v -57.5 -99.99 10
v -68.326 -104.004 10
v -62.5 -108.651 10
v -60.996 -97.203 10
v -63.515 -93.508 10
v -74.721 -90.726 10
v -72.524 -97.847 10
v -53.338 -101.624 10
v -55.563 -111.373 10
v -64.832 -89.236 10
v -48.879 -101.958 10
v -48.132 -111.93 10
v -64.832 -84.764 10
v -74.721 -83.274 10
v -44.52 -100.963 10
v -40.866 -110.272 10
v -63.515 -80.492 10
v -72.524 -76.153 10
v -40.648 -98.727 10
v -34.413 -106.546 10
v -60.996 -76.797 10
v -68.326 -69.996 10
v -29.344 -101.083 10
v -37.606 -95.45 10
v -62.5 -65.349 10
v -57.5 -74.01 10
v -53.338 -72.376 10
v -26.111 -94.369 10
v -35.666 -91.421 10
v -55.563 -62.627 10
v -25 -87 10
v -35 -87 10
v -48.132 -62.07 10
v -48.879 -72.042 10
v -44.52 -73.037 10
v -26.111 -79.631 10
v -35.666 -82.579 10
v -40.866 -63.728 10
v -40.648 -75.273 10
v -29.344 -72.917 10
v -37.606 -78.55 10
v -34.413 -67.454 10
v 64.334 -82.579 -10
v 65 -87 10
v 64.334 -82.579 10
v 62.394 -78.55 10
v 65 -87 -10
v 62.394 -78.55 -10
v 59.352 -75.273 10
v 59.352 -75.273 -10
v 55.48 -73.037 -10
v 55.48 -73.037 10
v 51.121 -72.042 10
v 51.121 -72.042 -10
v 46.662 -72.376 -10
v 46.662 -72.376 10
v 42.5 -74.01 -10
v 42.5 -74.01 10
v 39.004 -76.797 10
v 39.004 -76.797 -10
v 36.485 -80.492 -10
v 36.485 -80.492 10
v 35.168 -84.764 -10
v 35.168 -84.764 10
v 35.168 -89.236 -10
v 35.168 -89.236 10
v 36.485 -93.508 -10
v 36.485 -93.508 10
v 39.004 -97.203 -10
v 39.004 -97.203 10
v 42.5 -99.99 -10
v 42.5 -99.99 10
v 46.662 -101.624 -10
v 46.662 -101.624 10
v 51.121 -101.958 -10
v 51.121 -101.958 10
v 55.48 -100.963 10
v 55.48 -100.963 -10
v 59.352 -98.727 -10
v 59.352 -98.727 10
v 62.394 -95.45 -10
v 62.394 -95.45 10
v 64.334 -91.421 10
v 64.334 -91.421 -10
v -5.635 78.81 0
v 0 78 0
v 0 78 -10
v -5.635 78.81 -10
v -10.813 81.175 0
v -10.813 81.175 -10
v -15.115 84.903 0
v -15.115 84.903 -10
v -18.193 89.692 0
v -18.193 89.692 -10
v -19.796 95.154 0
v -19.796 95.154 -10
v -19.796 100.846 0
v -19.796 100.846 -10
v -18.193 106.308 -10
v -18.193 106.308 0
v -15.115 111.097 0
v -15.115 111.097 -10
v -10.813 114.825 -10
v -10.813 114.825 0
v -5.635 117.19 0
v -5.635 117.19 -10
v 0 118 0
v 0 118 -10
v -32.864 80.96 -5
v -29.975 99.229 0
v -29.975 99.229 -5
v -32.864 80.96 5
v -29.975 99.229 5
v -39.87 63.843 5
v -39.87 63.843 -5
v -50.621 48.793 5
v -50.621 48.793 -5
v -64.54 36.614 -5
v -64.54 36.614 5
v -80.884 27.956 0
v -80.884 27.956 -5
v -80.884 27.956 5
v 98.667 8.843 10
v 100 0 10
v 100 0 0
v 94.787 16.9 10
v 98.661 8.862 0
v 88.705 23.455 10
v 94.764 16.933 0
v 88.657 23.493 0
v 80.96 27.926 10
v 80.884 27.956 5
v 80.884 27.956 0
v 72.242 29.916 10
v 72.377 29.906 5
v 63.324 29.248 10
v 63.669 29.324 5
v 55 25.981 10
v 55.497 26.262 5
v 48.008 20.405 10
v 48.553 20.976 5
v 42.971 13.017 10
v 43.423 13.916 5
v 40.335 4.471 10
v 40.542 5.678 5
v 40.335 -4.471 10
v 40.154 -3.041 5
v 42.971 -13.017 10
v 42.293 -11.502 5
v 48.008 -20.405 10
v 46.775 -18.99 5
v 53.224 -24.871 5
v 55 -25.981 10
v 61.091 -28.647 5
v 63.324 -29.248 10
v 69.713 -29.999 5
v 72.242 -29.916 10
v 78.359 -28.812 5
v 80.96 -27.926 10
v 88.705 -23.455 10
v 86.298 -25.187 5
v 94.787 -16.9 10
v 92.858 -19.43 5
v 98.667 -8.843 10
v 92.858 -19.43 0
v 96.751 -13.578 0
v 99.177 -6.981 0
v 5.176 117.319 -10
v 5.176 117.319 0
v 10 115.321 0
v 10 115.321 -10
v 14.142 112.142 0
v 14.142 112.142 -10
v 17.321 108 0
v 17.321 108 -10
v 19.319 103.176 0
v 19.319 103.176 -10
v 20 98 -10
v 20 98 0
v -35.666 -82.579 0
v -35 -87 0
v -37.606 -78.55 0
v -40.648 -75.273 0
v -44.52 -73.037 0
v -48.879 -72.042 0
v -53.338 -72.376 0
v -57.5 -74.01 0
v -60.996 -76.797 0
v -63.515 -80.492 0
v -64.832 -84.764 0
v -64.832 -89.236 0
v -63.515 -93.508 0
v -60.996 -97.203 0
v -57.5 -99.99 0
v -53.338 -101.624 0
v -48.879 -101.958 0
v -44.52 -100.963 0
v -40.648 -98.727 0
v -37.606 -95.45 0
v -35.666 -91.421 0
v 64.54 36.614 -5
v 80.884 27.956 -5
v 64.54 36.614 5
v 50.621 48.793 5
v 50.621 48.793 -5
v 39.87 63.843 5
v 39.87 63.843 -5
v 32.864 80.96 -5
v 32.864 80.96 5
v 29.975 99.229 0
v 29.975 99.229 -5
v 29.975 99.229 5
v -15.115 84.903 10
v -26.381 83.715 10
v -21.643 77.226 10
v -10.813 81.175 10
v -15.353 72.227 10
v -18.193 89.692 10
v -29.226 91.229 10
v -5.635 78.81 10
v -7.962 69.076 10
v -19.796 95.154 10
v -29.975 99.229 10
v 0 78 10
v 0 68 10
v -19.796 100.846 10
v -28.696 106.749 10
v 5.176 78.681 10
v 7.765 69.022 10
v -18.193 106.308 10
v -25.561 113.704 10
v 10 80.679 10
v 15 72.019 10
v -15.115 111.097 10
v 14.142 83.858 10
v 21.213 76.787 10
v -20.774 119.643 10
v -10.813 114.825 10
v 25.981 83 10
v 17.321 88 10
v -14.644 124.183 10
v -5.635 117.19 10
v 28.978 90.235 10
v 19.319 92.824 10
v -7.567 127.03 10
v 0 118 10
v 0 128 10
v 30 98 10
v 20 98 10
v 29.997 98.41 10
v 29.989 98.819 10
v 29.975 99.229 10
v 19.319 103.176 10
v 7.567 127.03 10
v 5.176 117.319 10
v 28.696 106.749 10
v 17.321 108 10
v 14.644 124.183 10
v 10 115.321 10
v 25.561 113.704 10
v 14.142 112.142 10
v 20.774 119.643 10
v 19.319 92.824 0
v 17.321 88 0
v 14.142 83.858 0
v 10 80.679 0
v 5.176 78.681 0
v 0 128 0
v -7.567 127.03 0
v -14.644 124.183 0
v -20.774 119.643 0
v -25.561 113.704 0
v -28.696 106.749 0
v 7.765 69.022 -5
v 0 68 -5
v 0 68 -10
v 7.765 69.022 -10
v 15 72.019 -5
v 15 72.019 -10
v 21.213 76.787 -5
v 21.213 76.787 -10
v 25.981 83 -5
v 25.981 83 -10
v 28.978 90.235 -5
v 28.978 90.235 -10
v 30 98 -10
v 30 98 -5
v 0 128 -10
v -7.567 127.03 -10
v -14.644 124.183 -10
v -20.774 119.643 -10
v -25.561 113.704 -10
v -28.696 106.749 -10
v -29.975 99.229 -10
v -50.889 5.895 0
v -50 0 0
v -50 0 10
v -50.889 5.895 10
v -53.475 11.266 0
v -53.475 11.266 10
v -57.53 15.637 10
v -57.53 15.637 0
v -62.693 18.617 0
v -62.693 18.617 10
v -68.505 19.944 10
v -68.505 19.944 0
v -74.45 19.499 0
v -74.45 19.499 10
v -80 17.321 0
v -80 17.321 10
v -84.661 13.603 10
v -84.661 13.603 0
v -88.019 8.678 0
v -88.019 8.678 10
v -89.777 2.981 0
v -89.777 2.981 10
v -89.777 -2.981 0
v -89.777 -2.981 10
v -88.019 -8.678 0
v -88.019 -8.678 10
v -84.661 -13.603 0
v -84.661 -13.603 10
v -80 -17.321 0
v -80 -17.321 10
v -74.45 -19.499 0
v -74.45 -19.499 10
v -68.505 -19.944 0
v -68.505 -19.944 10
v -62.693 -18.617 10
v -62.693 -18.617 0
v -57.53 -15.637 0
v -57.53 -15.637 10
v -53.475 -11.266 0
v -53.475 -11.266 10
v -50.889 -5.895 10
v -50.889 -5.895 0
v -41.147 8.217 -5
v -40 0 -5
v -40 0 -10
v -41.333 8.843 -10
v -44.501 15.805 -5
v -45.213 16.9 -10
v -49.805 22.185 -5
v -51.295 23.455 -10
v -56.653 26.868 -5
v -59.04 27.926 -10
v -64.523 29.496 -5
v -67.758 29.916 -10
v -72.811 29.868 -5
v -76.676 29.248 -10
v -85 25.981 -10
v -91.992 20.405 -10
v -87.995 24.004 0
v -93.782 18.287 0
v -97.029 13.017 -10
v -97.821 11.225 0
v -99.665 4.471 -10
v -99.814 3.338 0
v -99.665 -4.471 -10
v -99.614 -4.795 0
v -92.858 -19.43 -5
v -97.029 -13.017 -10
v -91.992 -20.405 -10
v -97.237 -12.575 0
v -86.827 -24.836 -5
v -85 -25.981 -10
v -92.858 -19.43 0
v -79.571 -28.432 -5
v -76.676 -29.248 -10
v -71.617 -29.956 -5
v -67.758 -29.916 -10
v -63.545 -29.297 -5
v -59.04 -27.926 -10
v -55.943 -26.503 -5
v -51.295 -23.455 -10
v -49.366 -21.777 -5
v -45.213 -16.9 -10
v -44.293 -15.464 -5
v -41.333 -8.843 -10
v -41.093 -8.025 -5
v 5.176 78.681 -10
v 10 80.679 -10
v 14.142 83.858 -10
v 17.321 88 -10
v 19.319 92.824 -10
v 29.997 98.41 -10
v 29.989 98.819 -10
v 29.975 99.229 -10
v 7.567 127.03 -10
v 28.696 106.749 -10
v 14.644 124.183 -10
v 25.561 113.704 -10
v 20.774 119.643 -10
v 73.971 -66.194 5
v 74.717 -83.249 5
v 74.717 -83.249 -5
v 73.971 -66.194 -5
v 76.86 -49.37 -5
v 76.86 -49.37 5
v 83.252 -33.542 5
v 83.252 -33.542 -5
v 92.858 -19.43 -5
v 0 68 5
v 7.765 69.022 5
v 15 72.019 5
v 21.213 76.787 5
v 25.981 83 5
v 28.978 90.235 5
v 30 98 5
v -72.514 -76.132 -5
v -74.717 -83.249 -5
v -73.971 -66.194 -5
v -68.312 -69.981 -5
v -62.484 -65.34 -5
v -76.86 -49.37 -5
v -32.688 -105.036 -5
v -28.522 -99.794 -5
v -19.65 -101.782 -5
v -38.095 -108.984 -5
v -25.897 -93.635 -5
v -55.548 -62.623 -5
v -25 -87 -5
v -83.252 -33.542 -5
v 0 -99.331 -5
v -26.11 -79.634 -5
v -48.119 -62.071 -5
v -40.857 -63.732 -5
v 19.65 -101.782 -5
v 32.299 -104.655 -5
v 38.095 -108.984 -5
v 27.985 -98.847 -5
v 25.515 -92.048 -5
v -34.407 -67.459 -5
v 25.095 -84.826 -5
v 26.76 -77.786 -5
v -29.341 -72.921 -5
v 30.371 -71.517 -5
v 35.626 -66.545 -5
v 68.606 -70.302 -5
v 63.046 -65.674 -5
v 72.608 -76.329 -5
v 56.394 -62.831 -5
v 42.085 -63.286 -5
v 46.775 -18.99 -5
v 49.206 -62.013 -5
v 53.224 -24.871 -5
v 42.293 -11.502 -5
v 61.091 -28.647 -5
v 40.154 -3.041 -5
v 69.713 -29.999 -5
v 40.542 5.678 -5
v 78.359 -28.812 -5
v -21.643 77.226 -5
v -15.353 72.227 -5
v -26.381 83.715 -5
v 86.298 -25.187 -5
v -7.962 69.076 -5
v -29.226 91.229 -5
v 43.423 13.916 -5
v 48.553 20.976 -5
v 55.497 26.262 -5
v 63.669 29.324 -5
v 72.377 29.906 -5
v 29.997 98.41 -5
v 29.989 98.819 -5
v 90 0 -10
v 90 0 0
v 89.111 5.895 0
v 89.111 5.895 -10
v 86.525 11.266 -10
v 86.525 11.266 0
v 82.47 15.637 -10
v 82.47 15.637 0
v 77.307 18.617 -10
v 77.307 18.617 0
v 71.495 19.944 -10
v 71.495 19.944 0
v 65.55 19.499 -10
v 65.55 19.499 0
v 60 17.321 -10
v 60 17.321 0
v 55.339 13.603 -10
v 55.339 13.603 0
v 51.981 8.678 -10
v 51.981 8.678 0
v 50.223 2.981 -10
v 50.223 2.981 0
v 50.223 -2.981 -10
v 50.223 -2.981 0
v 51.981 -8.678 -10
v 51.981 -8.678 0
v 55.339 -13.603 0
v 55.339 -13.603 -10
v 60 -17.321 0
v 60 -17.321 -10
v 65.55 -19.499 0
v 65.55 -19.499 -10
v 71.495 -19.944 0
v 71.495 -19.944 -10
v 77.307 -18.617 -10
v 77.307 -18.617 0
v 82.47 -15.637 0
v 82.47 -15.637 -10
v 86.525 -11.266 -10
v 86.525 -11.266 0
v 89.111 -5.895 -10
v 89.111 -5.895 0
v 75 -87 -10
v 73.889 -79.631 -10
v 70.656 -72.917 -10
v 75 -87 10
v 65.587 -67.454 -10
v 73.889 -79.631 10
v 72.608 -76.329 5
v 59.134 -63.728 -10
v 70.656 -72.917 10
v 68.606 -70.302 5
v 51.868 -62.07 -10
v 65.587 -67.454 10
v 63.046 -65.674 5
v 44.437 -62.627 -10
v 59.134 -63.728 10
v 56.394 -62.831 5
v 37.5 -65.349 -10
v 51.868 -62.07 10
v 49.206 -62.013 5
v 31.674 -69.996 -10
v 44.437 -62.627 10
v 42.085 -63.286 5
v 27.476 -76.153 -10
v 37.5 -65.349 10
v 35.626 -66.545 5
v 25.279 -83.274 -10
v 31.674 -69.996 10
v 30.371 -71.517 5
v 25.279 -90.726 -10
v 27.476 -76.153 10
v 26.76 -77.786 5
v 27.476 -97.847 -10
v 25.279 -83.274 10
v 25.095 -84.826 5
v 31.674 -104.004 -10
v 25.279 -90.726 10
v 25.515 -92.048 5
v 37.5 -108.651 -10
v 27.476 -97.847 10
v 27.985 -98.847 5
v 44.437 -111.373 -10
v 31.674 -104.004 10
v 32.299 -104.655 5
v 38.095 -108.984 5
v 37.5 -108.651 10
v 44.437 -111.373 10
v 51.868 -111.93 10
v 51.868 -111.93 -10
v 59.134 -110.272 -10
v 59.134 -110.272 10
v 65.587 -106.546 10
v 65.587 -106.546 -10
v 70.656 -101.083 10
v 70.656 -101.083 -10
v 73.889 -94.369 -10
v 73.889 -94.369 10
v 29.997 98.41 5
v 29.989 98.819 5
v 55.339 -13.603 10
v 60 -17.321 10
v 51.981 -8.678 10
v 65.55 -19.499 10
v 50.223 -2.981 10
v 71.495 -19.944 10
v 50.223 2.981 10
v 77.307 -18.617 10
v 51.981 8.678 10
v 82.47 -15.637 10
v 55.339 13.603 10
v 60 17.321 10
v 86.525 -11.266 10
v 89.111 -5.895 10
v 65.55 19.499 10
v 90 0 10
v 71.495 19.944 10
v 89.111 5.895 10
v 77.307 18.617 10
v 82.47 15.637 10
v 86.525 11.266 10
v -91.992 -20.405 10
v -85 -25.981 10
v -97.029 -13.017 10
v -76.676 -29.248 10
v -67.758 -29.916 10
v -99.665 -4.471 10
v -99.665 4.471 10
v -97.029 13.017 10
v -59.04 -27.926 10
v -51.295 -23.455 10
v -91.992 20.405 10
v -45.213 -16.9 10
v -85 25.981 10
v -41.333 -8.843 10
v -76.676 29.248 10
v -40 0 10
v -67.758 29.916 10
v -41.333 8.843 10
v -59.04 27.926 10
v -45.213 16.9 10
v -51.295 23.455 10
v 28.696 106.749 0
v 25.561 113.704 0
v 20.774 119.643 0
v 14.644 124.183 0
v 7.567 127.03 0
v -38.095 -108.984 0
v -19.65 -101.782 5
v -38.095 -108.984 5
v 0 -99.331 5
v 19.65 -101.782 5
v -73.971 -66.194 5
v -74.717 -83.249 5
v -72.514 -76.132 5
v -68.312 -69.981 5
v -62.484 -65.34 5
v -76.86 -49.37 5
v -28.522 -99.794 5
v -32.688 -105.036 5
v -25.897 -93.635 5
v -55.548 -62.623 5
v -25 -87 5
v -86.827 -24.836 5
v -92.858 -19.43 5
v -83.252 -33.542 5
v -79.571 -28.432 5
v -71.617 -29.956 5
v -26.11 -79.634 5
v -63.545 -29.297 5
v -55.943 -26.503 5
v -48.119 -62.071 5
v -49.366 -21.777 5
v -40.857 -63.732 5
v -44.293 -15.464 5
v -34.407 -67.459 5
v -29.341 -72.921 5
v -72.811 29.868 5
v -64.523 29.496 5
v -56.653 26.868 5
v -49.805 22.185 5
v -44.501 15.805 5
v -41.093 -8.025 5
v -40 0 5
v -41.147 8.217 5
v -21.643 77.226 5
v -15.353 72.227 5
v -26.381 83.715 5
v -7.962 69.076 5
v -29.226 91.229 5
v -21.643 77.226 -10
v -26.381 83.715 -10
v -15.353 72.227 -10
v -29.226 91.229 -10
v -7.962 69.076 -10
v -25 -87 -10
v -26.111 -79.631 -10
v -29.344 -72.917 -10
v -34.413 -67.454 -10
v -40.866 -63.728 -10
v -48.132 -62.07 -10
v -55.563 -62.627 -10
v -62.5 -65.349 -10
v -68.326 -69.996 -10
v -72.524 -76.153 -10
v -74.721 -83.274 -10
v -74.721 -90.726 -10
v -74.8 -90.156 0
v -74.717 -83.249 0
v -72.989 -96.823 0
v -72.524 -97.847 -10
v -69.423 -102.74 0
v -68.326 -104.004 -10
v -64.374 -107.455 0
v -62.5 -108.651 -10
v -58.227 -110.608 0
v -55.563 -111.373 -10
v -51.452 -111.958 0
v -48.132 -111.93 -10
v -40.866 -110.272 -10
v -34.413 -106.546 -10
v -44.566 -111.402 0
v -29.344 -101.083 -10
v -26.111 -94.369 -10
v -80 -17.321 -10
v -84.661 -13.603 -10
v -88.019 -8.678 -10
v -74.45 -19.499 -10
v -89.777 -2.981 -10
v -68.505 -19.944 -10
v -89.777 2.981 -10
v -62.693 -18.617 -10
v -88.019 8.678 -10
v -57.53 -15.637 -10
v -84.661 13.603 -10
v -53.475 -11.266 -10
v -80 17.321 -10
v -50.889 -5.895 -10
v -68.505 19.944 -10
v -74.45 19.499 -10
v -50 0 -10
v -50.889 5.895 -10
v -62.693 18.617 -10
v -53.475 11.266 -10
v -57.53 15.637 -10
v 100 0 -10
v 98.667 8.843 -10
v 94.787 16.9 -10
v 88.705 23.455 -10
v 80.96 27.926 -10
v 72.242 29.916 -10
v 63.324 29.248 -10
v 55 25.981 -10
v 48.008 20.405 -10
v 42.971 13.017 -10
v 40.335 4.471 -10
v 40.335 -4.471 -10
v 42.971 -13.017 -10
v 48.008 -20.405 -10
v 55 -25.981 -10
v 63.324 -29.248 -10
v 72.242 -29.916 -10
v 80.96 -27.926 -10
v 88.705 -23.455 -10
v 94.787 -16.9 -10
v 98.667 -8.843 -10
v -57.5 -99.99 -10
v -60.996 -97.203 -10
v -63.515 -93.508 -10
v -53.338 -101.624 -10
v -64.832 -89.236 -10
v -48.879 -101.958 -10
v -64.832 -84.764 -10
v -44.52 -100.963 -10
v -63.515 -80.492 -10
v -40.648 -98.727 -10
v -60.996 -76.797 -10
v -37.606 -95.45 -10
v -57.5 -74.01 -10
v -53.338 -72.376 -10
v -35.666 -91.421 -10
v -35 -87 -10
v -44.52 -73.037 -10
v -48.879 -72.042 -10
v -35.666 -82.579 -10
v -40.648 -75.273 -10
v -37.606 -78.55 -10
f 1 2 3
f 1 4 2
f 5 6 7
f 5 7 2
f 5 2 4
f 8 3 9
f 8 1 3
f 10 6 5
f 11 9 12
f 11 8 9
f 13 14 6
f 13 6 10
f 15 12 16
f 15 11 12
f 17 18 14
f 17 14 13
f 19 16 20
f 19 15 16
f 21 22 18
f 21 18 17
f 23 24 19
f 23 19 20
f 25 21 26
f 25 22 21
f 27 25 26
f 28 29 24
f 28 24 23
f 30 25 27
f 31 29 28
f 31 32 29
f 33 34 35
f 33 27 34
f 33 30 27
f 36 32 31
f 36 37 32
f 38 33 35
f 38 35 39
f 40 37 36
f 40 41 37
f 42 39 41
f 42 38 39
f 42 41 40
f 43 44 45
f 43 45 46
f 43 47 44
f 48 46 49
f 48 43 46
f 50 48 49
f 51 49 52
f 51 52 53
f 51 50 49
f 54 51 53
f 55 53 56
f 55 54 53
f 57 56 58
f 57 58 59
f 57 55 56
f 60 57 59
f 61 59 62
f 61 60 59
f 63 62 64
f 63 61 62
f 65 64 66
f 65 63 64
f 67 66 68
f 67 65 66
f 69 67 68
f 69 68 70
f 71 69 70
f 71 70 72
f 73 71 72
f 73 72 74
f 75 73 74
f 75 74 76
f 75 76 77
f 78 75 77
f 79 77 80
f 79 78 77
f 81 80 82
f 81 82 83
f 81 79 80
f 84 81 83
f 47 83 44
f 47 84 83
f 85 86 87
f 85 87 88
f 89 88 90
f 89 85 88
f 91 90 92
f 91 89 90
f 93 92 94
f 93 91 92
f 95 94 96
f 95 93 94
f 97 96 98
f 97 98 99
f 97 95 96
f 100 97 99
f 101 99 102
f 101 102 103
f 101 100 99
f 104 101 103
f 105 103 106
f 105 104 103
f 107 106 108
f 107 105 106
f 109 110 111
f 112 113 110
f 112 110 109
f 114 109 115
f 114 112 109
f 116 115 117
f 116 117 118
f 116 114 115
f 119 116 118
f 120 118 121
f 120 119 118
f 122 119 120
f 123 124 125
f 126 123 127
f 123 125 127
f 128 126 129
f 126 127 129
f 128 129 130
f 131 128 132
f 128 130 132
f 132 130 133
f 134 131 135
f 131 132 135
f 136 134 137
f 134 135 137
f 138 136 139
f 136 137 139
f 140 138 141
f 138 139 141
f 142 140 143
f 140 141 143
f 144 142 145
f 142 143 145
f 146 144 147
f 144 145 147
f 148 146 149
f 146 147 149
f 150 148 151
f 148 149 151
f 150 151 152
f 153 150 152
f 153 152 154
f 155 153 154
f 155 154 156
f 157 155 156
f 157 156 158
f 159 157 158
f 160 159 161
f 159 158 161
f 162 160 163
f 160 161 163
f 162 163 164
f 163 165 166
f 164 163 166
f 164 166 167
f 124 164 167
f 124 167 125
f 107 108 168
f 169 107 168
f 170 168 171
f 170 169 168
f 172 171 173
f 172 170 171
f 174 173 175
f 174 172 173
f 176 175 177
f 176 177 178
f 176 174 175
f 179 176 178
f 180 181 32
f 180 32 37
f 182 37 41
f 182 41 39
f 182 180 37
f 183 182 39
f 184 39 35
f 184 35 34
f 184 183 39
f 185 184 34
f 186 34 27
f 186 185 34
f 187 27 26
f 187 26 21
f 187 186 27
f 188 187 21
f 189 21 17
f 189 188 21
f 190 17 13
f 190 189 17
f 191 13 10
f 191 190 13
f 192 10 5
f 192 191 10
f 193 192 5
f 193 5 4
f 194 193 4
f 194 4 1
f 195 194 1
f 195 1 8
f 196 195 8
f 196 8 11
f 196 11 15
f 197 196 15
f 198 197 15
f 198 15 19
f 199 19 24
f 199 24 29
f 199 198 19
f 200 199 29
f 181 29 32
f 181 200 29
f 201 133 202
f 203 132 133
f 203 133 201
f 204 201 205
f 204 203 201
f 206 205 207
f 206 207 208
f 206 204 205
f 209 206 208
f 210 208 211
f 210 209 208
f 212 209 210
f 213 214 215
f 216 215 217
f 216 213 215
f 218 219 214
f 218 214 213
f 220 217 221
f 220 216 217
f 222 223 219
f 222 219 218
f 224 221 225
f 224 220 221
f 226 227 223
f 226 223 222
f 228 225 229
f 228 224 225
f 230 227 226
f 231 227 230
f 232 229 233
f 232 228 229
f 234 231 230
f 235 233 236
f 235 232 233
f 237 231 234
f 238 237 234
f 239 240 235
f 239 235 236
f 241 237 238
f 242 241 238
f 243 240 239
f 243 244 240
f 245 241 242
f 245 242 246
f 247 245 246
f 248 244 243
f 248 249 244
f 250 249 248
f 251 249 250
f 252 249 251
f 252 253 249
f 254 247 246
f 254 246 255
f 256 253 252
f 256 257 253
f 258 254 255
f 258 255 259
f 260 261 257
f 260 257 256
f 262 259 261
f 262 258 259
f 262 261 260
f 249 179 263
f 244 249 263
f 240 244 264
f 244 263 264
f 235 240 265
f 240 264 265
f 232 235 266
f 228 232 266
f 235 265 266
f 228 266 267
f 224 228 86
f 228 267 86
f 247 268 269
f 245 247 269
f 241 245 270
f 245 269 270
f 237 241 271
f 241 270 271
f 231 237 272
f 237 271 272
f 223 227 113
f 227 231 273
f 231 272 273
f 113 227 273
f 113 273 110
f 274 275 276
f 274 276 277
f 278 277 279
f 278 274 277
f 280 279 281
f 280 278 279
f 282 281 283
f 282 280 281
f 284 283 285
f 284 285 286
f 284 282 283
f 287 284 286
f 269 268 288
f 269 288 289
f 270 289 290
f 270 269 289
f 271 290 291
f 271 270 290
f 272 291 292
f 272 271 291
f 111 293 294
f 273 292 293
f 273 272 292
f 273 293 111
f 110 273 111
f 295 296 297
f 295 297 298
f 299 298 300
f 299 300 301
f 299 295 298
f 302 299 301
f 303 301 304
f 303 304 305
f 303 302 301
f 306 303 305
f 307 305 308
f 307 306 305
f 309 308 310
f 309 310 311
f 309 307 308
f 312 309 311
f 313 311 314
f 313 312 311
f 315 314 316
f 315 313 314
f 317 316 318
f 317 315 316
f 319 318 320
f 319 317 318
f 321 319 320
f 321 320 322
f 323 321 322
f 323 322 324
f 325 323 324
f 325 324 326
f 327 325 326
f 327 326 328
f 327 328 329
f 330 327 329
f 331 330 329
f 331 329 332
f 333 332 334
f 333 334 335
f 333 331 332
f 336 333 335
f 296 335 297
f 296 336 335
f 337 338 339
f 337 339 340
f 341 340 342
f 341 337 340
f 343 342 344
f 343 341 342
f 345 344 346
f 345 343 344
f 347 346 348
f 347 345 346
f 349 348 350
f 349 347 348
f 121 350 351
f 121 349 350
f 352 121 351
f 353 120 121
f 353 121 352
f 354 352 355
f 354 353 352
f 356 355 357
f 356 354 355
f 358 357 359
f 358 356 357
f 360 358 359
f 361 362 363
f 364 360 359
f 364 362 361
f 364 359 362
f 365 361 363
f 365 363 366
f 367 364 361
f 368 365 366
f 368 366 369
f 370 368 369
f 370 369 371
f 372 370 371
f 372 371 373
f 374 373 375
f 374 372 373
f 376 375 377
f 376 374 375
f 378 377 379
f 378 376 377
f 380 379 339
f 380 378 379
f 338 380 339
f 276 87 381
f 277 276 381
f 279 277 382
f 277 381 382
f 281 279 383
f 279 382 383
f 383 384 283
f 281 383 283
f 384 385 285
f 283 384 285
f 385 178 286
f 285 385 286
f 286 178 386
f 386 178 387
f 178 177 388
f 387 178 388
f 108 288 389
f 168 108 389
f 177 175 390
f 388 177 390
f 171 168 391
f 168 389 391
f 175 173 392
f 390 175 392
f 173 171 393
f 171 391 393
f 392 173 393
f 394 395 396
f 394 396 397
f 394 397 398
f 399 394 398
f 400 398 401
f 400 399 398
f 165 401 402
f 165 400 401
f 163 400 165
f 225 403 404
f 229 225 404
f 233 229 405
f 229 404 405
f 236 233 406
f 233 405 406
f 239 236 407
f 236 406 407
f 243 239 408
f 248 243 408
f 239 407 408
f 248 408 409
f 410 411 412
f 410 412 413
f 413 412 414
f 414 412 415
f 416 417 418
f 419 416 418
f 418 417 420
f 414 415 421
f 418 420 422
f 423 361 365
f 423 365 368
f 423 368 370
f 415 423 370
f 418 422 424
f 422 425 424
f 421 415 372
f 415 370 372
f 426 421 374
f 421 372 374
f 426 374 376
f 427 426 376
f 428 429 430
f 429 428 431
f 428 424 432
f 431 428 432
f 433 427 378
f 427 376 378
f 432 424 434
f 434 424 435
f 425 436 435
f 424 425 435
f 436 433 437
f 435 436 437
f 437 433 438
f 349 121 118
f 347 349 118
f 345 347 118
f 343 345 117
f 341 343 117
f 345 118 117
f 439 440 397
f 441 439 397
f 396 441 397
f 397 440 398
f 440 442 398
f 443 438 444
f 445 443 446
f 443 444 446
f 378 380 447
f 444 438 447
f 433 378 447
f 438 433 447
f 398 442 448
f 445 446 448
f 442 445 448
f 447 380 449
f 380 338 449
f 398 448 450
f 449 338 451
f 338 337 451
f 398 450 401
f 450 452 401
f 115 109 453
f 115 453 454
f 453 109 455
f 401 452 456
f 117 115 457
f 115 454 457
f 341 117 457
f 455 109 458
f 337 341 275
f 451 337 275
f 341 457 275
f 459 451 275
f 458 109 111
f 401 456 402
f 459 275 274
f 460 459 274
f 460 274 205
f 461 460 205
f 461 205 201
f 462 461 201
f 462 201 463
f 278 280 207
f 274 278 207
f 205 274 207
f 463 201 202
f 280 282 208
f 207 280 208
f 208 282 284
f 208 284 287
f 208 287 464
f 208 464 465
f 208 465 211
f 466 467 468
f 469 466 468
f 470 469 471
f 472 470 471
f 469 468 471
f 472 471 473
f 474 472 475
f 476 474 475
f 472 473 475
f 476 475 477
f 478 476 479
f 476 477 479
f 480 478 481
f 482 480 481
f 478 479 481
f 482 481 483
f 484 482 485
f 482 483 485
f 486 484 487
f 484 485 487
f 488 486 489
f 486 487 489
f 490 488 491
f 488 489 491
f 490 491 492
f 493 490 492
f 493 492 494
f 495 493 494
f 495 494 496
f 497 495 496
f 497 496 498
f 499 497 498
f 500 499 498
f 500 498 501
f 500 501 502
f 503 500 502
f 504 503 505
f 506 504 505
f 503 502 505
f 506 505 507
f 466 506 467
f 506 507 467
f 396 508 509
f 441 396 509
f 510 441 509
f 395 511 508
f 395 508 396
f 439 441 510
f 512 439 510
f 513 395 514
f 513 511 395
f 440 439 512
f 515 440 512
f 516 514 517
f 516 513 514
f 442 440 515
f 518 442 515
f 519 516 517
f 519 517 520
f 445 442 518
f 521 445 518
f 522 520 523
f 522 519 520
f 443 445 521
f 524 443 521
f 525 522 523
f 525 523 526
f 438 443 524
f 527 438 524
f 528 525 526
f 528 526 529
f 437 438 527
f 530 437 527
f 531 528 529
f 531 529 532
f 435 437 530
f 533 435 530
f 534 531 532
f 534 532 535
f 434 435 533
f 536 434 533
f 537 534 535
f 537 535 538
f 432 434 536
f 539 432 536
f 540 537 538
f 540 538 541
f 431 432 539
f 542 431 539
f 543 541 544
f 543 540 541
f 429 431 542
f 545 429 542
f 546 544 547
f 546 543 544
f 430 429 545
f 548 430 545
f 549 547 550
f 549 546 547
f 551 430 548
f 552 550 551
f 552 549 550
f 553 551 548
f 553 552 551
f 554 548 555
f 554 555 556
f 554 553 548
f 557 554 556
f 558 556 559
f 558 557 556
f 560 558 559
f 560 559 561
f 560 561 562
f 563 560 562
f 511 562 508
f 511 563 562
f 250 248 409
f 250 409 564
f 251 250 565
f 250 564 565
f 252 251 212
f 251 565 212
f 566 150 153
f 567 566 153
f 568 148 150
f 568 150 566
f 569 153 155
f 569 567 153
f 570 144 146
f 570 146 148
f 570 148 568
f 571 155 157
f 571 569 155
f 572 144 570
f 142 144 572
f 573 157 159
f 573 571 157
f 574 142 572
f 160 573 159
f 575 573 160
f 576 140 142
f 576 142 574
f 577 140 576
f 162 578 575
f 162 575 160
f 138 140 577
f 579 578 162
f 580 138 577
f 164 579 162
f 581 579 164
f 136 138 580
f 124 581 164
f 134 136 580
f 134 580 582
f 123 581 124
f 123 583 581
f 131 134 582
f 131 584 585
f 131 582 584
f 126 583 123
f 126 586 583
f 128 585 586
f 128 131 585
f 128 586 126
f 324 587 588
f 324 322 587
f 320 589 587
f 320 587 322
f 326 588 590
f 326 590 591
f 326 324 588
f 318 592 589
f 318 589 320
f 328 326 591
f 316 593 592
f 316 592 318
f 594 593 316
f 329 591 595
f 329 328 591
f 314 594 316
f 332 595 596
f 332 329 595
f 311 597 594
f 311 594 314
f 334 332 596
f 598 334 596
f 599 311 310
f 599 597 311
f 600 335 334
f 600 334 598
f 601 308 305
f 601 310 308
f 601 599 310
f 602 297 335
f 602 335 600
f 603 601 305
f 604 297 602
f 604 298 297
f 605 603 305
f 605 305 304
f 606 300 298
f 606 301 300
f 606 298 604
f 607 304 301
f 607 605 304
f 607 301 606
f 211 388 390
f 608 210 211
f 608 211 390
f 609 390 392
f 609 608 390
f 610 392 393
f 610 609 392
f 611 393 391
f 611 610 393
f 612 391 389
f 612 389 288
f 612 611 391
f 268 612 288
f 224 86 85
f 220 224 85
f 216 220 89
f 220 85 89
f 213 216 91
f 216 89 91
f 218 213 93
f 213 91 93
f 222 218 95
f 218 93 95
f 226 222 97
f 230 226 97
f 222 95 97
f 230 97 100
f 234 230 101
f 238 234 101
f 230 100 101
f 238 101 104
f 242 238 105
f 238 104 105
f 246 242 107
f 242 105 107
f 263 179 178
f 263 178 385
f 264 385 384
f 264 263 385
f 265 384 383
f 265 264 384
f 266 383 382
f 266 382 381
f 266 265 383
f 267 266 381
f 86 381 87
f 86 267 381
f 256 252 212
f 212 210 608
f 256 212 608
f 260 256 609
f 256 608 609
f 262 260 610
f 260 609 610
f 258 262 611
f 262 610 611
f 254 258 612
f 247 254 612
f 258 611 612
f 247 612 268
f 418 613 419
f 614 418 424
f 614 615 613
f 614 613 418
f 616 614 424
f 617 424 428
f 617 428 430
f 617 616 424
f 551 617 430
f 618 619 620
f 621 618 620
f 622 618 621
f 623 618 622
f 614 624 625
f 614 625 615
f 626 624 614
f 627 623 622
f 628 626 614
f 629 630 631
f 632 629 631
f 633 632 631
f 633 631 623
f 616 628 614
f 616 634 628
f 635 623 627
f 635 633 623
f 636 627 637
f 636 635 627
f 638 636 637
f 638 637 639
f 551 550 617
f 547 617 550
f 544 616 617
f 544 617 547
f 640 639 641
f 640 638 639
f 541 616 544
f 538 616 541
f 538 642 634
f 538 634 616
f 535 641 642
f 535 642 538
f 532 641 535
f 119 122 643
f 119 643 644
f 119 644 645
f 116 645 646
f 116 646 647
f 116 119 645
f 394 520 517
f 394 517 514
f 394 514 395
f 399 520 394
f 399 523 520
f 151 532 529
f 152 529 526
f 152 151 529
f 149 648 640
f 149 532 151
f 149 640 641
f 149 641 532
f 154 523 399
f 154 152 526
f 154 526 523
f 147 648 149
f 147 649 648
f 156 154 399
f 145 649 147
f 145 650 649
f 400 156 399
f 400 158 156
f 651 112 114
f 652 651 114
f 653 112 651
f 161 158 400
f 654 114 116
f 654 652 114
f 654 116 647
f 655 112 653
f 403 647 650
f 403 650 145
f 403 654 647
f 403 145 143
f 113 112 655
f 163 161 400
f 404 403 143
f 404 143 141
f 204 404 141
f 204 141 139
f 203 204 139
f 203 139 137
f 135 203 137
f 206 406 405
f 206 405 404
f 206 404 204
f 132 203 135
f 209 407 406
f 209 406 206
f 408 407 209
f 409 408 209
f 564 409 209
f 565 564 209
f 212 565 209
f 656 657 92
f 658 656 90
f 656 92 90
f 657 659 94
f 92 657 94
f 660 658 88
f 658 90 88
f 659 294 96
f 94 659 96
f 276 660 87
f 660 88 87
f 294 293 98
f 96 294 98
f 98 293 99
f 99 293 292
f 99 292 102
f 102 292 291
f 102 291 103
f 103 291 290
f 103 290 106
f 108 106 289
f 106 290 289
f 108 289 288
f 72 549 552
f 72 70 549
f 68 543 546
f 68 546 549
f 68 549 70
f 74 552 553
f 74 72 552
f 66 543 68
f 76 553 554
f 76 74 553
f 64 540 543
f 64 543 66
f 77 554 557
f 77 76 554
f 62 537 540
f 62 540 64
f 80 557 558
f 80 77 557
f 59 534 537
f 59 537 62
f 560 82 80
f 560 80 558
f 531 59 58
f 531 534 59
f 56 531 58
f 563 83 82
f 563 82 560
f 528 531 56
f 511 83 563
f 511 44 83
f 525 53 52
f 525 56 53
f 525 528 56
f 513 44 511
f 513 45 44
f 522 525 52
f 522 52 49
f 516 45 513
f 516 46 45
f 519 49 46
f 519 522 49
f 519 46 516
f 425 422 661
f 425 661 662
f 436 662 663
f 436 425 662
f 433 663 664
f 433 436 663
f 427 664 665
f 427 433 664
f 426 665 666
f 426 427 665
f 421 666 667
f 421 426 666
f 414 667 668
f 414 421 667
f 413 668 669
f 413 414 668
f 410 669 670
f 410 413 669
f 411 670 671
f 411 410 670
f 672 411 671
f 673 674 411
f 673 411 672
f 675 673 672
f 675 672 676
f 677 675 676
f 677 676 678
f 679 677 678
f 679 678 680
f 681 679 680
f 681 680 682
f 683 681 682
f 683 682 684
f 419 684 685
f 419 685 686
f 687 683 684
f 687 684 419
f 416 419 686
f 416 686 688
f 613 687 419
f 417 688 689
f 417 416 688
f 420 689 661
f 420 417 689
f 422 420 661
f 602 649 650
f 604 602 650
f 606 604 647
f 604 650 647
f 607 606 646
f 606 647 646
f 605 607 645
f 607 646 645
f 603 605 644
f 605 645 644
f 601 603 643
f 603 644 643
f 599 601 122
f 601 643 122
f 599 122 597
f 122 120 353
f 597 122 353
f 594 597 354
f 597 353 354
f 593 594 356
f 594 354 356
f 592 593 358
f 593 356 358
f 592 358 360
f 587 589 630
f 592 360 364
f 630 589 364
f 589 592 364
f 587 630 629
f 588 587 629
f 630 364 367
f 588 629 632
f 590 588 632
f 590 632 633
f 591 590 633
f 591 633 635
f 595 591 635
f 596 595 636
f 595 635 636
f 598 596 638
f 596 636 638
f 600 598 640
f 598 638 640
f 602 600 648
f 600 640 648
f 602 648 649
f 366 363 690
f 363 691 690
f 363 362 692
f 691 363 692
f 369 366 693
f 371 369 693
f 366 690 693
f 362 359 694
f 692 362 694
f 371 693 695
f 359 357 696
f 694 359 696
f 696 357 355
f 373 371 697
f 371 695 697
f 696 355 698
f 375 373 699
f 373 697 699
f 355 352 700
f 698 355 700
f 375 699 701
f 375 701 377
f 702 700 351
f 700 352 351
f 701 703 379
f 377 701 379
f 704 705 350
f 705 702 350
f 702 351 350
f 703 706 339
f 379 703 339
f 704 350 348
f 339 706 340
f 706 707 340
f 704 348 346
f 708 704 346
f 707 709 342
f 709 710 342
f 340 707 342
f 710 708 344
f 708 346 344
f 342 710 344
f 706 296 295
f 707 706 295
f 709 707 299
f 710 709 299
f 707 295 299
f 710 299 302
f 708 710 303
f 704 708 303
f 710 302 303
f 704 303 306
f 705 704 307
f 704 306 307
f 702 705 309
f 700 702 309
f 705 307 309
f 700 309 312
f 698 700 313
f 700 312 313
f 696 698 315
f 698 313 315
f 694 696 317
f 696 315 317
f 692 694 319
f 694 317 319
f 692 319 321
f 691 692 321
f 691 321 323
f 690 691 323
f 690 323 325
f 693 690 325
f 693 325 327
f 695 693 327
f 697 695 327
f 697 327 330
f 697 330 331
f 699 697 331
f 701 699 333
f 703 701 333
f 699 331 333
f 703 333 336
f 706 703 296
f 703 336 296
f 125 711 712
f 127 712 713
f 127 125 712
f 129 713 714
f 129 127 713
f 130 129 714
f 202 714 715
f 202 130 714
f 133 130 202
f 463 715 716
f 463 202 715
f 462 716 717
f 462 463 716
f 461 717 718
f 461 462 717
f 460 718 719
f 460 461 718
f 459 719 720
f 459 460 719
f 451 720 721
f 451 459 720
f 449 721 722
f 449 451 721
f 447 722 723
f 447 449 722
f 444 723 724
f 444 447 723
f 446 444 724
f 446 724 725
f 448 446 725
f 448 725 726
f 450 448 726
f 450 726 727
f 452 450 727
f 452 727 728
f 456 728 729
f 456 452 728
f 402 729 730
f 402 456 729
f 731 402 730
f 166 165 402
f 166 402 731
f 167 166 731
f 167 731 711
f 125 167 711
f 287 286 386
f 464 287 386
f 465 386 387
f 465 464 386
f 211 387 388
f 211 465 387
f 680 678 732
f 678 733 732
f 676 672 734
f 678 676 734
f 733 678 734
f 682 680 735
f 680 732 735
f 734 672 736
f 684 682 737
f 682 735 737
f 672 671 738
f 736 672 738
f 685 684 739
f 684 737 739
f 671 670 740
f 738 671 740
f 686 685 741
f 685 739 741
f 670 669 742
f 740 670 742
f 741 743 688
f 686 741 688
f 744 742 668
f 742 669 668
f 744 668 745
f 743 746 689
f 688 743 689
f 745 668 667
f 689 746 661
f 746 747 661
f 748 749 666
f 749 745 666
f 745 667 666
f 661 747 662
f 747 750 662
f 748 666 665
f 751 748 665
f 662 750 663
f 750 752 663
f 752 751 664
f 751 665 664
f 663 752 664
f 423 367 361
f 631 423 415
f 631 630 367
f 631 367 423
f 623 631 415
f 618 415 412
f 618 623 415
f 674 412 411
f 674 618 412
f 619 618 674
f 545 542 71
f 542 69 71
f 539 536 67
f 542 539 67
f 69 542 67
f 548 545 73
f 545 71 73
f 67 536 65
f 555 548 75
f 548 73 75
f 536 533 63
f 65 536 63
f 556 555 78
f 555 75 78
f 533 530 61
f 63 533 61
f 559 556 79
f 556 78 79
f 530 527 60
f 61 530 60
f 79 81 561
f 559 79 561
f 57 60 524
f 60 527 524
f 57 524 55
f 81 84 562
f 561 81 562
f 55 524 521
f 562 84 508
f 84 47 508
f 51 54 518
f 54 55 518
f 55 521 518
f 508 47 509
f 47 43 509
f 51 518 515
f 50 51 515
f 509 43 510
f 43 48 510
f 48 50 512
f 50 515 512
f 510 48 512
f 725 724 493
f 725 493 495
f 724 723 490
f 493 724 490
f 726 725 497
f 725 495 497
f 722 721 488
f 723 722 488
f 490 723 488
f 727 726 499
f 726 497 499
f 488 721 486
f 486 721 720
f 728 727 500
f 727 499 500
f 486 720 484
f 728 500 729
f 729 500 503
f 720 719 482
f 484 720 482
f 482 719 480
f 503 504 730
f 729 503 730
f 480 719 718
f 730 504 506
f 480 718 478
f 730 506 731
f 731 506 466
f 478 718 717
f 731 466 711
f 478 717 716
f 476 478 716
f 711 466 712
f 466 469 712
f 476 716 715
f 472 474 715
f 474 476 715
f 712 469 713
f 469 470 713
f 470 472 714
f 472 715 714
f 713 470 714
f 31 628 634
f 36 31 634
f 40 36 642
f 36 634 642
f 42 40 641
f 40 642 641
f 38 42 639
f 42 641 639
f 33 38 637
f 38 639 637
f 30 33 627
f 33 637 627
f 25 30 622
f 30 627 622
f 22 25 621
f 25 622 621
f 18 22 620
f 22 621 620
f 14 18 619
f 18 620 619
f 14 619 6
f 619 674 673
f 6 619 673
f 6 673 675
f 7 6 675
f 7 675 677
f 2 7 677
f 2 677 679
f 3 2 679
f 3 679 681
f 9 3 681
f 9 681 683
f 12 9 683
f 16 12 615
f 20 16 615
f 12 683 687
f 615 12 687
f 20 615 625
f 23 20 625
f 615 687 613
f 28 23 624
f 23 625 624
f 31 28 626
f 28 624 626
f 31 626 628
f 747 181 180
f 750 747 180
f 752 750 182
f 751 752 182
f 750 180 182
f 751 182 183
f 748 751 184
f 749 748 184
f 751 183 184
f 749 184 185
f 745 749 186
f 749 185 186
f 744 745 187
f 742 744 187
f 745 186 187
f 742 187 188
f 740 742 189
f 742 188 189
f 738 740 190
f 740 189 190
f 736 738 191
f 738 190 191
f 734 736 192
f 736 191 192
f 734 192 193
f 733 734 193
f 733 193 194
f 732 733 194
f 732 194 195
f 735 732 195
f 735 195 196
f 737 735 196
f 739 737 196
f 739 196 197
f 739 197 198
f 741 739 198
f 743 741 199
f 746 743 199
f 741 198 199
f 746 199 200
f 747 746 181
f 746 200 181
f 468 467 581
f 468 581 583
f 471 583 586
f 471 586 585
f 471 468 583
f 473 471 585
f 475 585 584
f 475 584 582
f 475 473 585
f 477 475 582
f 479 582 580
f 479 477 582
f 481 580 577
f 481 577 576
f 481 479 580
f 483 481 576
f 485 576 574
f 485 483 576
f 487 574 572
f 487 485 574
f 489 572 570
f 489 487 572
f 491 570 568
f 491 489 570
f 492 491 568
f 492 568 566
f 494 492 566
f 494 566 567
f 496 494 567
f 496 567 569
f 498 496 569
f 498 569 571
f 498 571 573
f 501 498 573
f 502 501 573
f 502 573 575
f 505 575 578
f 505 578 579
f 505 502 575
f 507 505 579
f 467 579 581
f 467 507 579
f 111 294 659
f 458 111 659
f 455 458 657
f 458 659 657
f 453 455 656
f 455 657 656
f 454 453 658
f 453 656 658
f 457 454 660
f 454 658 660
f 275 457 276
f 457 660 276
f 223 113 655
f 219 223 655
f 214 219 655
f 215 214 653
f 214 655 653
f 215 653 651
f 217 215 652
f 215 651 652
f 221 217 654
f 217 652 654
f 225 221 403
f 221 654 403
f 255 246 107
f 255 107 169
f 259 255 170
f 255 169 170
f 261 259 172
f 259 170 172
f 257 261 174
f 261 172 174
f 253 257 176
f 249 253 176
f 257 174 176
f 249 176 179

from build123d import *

# Parameters (mm, degrees)
BOSS_EXTRUDE1_DEPTH = 5
SKETCH1_3_R         = 30
SKETCH1_3_R_2       = 20
SKETCH1_3_R_3       = 25
SKETCH1_3_R_4       = 15
BOSS_EXTRUDE2_DEPTH = 10


with BuildPart() as part:
    # Sketch1 → Boss-Extrude1 (new, symmetric)
    with BuildSketch(Plane.XY):
        with BuildLine():
            ThreePointArc((30, 98), (21.213203436, 76.786796564), (0, 68))
            ThreePointArc((0, 68), (-21.643279891, 77.22577473), (-29.974824802, 99.228770963))
            ThreePointArc((-29.974824802, 99.228770963), (-44.809013245, 56.006438032), (-80.883915711, 27.95604369))
            ThreePointArc((-80.883915711, 27.95604369), (-53.066563718, 24.764061373), (-40, 0))
            ThreePointArc((-40, 0), (-59.649329868, -28.157834217), (-92.857575187, -19.430163575))
            ThreePointArc((-92.857575187, -19.430163575), (-76.859583983, -49.370140698), (-74.716930719, -83.248555502))
            ThreePointArc((-74.716930719, -83.248555502), (-48.118945506, -62.070867765), (-25, -87))
            ThreePointArc((-25, -87), (-28.521882675, -99.794157893), (-38.095238095, -108.983553944))
            ThreePointArc((-38.095238095, -108.983553944), (0, -99.330926563), (38.095238095, -108.983553944))
            ThreePointArc((38.095238095, -108.983553944), (35.626049477, -66.54542725), (74.716930719, -83.248555502))
            ThreePointArc((74.716930719, -83.248555502), (76.859583983, -49.370140698), (92.857575187, -19.430163575))
            ThreePointArc((92.857575187, -19.430163575), (40.914175072, -7.349475372), (80.883915711, 27.95604369))
            ThreePointArc((80.883915711, 27.95604369), (44.809013245, 56.006438032), (29.974824802, 99.228770963))
            ThreePointArc((29.974824802, 99.228770963), (29.99370554, 98.614514416), (30, 98))
        make_face()
    extrude(amount=BOSS_EXTRUDE1_DEPTH, both=True)

    # Sketch1<3> → Boss-Extrude2 (add, symmetric)
    # profile 1 of 5: a face of its own
    with BuildSketch(Plane.XY):
        with Locations((0, 98)):
            Circle(SKETCH1_3_R)
        with Locations((0, 98)):
            Circle(SKETCH1_3_R_2, mode=Mode.SUBTRACT)
    # profile 2 of 5: a face of its own
    with BuildSketch(Plane.XY):
        with Locations((-70, 0)):
            Circle(SKETCH1_3_R)
        with Locations((-70, 0)):
            Circle(SKETCH1_3_R_2, mode=Mode.SUBTRACT)
    # profile 3 of 5: a face of its own
    with BuildSketch(Plane.XY):
        with Locations((70, 0)):
            Circle(SKETCH1_3_R)
        with Locations((70, 0)):
            Circle(SKETCH1_3_R_2, mode=Mode.SUBTRACT)
    # profile 4 of 5: a face of its own
    with BuildSketch(Plane.XY):
        with Locations((-50, -87)):
            Circle(SKETCH1_3_R_3)
        with Locations((-50, -87)):
            Circle(SKETCH1_3_R_4, mode=Mode.SUBTRACT)
    # profile 5 of 5: a face of its own
    with BuildSketch(Plane.XY):
        with Locations((50, -87)):
            Circle(SKETCH1_3_R_3)
        with Locations((50, -87)):
            Circle(SKETCH1_3_R_4, mode=Mode.SUBTRACT)
    extrude(amount=BOSS_EXTRUDE2_DEPTH, both=True)


solid = part.part
